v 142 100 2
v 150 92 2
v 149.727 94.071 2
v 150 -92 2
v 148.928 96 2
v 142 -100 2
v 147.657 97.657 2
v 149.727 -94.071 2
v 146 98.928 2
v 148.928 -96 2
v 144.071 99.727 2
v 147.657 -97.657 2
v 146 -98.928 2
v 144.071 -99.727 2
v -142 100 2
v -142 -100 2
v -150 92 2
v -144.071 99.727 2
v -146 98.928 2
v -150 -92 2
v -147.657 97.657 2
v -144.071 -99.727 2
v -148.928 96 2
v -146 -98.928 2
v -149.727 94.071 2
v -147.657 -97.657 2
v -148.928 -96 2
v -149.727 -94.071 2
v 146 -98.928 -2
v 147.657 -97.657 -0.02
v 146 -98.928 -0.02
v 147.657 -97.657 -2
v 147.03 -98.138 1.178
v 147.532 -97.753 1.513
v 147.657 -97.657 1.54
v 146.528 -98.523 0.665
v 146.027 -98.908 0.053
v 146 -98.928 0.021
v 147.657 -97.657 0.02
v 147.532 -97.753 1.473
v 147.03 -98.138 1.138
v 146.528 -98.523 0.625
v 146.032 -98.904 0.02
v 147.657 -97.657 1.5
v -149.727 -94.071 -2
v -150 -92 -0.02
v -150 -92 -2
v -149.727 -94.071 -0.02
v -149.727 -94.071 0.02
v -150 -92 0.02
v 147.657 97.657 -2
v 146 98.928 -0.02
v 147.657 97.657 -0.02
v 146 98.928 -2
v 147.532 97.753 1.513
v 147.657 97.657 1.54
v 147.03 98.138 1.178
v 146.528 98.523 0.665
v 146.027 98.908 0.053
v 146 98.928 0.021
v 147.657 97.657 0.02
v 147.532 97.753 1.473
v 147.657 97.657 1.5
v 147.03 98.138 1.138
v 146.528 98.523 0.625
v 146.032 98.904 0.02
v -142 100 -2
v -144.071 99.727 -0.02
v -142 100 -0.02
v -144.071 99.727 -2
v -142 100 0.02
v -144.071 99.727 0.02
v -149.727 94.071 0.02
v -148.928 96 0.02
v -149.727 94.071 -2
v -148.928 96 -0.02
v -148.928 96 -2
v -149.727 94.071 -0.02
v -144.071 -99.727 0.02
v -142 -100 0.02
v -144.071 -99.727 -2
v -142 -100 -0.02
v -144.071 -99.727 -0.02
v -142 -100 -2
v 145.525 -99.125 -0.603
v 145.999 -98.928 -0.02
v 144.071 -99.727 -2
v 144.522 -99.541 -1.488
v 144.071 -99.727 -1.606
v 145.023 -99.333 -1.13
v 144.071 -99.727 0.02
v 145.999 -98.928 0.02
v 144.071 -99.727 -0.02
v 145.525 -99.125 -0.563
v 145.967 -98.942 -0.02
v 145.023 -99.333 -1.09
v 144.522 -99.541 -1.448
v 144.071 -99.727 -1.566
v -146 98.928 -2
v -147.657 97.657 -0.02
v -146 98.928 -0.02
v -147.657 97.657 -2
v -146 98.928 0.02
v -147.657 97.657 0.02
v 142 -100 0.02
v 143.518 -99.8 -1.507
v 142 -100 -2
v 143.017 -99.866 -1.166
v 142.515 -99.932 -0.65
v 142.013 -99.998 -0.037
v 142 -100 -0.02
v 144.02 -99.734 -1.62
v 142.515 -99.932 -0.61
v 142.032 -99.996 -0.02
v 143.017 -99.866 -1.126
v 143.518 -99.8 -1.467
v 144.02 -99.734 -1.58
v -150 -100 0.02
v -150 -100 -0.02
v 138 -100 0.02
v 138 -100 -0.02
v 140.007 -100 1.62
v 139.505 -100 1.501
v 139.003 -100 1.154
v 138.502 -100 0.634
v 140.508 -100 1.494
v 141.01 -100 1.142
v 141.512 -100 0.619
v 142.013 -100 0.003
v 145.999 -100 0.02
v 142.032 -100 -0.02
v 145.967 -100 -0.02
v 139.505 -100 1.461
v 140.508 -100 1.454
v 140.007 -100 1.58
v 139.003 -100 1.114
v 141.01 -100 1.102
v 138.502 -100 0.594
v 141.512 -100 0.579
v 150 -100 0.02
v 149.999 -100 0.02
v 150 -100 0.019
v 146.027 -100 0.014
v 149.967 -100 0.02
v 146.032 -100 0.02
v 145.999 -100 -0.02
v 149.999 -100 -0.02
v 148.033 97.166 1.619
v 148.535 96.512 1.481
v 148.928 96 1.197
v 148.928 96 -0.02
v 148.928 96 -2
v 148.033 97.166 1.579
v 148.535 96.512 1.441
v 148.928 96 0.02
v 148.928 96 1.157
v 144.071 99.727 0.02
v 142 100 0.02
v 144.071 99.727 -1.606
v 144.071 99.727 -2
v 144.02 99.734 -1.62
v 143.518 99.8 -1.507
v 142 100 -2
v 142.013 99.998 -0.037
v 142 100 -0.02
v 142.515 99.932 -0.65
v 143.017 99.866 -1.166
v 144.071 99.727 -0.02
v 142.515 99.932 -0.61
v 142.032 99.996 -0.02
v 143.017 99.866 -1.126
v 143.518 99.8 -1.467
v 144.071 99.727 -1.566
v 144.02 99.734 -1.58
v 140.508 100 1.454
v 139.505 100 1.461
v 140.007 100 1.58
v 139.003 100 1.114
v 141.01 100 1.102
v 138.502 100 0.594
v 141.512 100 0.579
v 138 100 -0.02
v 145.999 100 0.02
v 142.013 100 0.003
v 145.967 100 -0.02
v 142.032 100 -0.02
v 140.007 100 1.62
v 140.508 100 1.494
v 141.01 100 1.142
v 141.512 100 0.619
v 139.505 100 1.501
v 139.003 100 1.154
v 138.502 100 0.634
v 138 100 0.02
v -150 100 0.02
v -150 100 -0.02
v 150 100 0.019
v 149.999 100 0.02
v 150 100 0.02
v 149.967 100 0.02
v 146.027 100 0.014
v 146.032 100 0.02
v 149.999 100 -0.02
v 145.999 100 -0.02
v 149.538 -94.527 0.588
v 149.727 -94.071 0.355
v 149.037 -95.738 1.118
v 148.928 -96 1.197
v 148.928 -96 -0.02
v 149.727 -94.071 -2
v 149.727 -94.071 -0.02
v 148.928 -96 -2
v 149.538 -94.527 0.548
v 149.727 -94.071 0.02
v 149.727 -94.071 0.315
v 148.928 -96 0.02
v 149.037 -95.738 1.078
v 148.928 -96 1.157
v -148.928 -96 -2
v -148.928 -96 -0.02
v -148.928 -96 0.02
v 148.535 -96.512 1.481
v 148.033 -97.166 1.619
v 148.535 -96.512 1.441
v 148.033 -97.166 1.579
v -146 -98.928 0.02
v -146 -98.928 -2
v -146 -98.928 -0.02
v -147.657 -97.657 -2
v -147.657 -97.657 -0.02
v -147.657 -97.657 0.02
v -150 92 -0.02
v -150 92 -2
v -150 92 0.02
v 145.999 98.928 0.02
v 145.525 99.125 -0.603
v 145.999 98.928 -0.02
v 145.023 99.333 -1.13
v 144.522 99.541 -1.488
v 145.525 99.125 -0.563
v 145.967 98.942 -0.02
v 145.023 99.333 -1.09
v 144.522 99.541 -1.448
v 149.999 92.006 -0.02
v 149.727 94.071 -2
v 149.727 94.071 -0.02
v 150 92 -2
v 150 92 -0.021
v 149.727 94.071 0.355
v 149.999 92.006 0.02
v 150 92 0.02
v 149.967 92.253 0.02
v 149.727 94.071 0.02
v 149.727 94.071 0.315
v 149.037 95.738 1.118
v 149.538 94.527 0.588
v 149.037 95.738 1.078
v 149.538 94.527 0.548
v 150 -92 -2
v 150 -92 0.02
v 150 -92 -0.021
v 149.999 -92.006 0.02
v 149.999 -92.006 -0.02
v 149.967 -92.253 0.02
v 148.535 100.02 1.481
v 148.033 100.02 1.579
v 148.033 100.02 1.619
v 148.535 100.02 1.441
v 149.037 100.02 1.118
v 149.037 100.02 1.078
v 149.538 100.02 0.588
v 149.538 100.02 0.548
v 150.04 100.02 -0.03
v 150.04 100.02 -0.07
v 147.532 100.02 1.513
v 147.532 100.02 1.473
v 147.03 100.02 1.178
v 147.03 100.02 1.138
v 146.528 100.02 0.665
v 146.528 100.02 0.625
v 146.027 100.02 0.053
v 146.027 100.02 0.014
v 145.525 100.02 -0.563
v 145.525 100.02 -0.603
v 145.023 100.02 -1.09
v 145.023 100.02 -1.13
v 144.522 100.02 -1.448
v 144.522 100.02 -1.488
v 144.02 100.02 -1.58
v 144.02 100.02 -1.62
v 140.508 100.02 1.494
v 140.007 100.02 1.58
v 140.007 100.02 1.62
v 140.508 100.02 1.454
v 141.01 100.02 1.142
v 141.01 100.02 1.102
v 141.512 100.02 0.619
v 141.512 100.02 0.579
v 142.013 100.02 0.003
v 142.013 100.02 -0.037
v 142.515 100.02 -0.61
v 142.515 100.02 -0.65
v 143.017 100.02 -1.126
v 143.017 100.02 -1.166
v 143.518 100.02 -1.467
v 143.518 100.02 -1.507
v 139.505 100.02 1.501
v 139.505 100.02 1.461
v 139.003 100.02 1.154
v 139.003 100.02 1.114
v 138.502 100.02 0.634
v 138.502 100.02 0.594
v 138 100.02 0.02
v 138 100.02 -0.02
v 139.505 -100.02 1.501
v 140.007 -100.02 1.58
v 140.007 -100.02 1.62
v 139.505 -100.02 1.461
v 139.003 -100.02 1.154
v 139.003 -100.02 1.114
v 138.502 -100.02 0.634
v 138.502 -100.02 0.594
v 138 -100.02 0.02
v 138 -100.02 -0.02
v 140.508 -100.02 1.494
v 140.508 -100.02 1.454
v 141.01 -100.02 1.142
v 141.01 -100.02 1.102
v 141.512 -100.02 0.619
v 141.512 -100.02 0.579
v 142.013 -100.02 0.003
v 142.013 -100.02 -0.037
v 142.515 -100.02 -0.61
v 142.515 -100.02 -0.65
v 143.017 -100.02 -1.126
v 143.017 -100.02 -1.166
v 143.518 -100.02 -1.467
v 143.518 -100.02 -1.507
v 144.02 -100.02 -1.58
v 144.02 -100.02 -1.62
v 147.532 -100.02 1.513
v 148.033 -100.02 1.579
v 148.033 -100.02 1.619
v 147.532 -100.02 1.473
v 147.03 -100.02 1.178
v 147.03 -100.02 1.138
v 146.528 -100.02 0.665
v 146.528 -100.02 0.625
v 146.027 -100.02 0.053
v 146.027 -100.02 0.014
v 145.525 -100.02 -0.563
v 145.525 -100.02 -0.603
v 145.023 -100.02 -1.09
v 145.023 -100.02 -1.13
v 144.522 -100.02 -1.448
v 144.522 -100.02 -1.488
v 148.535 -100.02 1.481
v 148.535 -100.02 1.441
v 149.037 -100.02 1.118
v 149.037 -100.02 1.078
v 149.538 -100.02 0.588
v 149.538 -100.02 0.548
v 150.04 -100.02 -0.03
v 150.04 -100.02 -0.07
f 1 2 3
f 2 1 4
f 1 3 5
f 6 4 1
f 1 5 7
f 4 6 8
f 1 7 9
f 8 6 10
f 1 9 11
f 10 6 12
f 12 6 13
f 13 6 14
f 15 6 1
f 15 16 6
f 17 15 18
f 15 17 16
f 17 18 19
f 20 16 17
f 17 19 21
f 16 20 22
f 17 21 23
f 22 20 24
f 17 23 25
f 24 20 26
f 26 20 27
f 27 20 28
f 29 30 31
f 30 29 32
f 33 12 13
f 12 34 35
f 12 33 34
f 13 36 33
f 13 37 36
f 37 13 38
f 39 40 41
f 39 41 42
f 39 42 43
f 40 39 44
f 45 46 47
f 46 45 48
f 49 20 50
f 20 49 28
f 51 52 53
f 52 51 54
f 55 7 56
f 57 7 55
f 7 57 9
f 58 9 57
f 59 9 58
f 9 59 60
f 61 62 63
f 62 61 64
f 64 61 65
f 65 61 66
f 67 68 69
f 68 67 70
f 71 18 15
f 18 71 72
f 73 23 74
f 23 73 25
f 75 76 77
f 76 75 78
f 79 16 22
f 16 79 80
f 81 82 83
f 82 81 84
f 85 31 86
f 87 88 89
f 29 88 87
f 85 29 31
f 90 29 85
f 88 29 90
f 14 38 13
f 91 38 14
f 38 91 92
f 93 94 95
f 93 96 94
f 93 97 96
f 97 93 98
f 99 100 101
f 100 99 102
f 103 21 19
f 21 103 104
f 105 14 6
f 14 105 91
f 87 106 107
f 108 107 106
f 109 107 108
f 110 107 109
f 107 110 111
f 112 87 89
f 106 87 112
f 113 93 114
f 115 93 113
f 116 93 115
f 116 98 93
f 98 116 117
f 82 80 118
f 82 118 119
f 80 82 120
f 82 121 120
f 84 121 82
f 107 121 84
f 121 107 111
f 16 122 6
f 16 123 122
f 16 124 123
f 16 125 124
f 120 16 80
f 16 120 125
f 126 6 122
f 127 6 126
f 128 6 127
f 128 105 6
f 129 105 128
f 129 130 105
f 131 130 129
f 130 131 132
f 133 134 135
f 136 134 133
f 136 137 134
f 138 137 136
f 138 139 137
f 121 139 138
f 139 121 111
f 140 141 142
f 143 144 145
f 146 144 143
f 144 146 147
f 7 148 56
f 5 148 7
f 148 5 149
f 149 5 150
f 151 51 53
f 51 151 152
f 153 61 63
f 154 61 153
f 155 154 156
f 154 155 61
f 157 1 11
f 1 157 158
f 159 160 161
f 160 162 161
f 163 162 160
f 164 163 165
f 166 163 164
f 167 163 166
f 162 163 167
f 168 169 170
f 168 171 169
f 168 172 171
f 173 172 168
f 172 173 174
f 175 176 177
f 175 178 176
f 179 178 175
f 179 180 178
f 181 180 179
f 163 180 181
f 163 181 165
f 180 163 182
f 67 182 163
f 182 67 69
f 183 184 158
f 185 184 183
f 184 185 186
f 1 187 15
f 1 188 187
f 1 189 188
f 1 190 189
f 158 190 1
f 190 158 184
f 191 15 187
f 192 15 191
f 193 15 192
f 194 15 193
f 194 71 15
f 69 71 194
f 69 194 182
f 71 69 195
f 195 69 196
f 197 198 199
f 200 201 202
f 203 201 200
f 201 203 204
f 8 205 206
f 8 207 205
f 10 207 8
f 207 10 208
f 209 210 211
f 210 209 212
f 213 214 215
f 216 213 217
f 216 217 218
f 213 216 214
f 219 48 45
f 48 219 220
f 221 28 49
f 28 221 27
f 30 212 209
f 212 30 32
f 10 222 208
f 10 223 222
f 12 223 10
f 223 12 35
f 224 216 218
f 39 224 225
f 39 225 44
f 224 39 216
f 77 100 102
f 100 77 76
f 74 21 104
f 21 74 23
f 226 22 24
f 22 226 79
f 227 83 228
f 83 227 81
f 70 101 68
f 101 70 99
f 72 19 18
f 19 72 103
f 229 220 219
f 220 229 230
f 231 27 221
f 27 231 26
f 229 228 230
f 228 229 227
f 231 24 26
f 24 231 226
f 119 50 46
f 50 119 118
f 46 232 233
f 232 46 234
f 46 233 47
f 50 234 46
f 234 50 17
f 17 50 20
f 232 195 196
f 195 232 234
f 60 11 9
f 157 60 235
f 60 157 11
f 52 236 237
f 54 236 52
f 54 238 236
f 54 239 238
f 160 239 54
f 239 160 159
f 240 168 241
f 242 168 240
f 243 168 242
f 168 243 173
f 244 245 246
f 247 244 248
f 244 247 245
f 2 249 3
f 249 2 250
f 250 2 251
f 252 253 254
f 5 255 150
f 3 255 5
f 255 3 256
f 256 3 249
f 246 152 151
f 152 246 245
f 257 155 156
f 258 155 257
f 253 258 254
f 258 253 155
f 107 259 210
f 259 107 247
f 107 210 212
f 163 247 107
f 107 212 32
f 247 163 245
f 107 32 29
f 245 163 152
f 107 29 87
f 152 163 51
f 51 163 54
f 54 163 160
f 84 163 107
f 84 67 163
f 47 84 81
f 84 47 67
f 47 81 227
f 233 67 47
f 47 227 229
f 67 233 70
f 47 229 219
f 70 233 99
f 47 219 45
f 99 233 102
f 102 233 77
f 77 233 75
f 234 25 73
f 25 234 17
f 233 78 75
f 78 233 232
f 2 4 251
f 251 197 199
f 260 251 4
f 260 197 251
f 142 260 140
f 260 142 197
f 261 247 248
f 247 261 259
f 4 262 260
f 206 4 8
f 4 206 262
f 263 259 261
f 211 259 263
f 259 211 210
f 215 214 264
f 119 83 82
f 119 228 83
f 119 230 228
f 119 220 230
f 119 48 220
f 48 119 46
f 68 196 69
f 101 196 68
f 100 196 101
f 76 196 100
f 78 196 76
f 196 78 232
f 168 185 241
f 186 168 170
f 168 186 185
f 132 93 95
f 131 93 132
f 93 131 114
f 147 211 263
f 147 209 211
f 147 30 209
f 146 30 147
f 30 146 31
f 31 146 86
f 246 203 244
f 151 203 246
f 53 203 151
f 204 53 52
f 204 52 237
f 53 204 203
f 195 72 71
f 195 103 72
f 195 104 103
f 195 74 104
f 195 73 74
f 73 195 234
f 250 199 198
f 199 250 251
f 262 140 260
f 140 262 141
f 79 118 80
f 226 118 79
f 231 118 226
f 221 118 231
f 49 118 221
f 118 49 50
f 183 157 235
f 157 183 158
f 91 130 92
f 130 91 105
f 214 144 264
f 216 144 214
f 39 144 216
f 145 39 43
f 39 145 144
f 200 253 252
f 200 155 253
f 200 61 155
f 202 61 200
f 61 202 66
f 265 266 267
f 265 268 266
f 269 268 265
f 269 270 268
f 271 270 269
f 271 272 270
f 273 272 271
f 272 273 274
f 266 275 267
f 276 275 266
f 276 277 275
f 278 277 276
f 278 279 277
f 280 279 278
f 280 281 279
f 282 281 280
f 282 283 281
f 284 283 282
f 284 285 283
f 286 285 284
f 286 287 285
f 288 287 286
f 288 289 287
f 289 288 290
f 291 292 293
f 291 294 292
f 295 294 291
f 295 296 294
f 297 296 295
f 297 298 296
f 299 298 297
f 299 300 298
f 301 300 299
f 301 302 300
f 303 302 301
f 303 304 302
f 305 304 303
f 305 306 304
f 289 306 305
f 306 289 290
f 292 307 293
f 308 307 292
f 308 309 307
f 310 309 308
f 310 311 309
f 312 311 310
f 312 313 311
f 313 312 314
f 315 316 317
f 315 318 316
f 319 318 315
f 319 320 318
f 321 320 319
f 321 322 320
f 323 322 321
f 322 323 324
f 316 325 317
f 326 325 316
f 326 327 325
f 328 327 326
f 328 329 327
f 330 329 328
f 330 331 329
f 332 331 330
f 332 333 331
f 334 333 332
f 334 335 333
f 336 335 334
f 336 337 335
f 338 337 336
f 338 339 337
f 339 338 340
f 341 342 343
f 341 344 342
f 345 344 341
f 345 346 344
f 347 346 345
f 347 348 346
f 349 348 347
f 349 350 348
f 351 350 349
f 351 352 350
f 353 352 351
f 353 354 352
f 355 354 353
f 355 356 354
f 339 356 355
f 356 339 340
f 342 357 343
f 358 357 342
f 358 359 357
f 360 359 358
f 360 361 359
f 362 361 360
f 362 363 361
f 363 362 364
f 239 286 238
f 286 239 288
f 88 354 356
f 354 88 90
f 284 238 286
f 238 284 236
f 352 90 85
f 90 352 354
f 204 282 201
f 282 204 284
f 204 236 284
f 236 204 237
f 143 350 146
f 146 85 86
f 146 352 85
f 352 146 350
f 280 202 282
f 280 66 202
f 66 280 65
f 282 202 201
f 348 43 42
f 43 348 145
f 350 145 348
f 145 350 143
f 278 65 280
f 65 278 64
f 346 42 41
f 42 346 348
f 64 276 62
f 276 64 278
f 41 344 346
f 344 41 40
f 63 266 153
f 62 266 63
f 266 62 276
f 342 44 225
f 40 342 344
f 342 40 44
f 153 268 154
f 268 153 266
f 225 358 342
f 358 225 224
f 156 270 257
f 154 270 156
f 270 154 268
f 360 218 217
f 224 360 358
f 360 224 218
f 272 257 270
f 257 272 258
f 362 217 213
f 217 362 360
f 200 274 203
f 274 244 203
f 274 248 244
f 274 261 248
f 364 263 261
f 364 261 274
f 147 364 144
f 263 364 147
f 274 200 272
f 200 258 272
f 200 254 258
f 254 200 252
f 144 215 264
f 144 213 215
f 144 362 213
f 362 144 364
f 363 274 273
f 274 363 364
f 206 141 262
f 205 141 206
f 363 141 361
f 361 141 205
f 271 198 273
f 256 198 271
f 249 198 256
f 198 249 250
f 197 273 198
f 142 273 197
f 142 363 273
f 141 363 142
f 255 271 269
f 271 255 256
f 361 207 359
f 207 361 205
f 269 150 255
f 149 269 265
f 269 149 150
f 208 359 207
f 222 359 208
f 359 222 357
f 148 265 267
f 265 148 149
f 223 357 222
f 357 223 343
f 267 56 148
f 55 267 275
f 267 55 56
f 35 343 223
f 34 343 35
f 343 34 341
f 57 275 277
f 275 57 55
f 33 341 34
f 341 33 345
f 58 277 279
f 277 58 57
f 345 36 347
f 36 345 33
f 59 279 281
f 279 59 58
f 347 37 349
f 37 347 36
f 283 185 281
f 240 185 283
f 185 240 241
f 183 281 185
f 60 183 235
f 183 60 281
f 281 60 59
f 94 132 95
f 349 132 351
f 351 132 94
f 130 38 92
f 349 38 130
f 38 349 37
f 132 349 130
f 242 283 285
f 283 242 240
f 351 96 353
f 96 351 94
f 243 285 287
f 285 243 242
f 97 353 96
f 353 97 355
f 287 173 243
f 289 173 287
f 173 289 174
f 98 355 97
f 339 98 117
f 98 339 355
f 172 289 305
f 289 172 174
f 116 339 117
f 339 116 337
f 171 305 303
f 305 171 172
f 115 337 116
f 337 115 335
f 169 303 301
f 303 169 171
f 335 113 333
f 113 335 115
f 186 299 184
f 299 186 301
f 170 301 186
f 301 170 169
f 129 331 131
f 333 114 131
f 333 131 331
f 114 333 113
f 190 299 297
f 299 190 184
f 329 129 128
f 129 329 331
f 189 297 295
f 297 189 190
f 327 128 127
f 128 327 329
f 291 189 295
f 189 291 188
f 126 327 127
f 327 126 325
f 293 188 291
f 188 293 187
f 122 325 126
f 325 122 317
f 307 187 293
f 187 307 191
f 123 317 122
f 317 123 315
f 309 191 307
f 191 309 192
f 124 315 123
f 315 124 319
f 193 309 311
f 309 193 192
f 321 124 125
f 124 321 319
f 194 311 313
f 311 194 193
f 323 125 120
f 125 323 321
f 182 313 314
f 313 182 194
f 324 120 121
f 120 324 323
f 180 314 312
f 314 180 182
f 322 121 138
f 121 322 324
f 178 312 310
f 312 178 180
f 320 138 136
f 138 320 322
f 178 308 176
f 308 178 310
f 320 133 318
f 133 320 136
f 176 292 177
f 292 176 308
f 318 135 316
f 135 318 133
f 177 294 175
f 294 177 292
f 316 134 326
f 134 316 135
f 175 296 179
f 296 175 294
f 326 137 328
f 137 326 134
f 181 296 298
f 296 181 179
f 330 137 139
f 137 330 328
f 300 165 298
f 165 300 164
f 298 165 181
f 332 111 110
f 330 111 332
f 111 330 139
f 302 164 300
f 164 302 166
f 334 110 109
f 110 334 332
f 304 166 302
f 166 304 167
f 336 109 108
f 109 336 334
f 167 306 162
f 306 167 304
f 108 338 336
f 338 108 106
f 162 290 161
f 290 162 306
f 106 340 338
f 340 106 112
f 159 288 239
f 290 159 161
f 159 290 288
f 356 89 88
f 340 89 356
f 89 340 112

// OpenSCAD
// Corrugated cardboard sheet (render-friendly)
// Single connected solid: rounded sheet + internal fluted core + optional exposed edge.
// Simplified: removed heavy face groove cutters and redundant booleans.

// ---------------- Parameters ----------------
sheet_L = 300; //[150:600:1]
sheet_W = 200; //[100:400:1]
sheet_T = 4;   //[2:8:0.1]
liner_T = 0.4; //[0.2:0.8:0.05]

flute_pitch = 8; //[4:16:0.5]
flute_amp = 1.6; //[0.8:3.2:0.1]

corner_R = 8; //[2:20:0.5]

edge_detail_depth = 12; //[0:40:1]
edge_detail_on = 1;     //[0:1:1]

// Quality
$fn = 24;

// ---------------- Derived ----------------
eps = 0.02;
core_T = max(0.2, sheet_T - 2*liner_T);

// ---------------- Helpers ----------------
module rounded_rect_prism(L, W, H, R) {
  r = max(0, min(R, min(L, W)/2 - eps));
  linear_extrude(height=H, center=true, convexity=4)
    offset(r=r)
      square([L - 2*r, W - 2*r], center=true);
}

function wave_y(x, pitch, amp) = amp * sin(360 * x / pitch);

module fluted_core_solid(L, W, T, pitch, amp) {
  // 2D X-Z ribbon extruded along Y
  n = max(24, ceil(L / (pitch/2)));   // reduced segments for speed
  dx = L / n;

  a = min(amp, max(0.05, T/2 - eps));

  top_pts = [
    for (i = [0:n])
      let(x = -L/2 + i*dx)
      [x,  T/2 - a + wave_y(x + L/2, pitch, a)]
  ];

  bot_pts = [
    for (i = [n:-1:0])
      let(x = -L/2 + i*dx)
      [x, -T/2 + a + wave_y(x + L/2, pitch, a)]
  ];

  rotate([90,0,0])
    linear_extrude(height=W, center=true, convexity=6)
      polygon(points=concat(top_pts, bot_pts));
}

module edge_flute_window(L, W, T, pitch, amp, depth) {
  d = max(0, depth);
  if (d > 0) {
    // Add a short fluted section at +X edge (unioned, connected)
    translate([L/2 - d/2 + eps, 0, 0])
      fluted_core_solid(d + 2*eps, W + 2*eps, T, pitch, amp);
  }
}

// ---------------- Main model ----------------
module corrugated_cardboard_sheet() {
  union() {
    // Outer sheet
    rounded_rect_prism(sheet_L, sheet_W, sheet_T, corner_R);

    // Internal fluted core (slightly thicker to ensure intersection with liners)
    fluted_core_solid(sheet_L, sheet_W, core_T + 2*eps, flute_pitch, flute_amp);

    // Optional exposed edge detail
    if (edge_detail_on)
      edge_flute_window(sheet_L, sheet_W, core_T + 2*eps, flute_pitch, flute_amp, edge_detail_depth);
  }
}

// ---------------- Final Output ----------------
corrugated_cardboard_sheet();
